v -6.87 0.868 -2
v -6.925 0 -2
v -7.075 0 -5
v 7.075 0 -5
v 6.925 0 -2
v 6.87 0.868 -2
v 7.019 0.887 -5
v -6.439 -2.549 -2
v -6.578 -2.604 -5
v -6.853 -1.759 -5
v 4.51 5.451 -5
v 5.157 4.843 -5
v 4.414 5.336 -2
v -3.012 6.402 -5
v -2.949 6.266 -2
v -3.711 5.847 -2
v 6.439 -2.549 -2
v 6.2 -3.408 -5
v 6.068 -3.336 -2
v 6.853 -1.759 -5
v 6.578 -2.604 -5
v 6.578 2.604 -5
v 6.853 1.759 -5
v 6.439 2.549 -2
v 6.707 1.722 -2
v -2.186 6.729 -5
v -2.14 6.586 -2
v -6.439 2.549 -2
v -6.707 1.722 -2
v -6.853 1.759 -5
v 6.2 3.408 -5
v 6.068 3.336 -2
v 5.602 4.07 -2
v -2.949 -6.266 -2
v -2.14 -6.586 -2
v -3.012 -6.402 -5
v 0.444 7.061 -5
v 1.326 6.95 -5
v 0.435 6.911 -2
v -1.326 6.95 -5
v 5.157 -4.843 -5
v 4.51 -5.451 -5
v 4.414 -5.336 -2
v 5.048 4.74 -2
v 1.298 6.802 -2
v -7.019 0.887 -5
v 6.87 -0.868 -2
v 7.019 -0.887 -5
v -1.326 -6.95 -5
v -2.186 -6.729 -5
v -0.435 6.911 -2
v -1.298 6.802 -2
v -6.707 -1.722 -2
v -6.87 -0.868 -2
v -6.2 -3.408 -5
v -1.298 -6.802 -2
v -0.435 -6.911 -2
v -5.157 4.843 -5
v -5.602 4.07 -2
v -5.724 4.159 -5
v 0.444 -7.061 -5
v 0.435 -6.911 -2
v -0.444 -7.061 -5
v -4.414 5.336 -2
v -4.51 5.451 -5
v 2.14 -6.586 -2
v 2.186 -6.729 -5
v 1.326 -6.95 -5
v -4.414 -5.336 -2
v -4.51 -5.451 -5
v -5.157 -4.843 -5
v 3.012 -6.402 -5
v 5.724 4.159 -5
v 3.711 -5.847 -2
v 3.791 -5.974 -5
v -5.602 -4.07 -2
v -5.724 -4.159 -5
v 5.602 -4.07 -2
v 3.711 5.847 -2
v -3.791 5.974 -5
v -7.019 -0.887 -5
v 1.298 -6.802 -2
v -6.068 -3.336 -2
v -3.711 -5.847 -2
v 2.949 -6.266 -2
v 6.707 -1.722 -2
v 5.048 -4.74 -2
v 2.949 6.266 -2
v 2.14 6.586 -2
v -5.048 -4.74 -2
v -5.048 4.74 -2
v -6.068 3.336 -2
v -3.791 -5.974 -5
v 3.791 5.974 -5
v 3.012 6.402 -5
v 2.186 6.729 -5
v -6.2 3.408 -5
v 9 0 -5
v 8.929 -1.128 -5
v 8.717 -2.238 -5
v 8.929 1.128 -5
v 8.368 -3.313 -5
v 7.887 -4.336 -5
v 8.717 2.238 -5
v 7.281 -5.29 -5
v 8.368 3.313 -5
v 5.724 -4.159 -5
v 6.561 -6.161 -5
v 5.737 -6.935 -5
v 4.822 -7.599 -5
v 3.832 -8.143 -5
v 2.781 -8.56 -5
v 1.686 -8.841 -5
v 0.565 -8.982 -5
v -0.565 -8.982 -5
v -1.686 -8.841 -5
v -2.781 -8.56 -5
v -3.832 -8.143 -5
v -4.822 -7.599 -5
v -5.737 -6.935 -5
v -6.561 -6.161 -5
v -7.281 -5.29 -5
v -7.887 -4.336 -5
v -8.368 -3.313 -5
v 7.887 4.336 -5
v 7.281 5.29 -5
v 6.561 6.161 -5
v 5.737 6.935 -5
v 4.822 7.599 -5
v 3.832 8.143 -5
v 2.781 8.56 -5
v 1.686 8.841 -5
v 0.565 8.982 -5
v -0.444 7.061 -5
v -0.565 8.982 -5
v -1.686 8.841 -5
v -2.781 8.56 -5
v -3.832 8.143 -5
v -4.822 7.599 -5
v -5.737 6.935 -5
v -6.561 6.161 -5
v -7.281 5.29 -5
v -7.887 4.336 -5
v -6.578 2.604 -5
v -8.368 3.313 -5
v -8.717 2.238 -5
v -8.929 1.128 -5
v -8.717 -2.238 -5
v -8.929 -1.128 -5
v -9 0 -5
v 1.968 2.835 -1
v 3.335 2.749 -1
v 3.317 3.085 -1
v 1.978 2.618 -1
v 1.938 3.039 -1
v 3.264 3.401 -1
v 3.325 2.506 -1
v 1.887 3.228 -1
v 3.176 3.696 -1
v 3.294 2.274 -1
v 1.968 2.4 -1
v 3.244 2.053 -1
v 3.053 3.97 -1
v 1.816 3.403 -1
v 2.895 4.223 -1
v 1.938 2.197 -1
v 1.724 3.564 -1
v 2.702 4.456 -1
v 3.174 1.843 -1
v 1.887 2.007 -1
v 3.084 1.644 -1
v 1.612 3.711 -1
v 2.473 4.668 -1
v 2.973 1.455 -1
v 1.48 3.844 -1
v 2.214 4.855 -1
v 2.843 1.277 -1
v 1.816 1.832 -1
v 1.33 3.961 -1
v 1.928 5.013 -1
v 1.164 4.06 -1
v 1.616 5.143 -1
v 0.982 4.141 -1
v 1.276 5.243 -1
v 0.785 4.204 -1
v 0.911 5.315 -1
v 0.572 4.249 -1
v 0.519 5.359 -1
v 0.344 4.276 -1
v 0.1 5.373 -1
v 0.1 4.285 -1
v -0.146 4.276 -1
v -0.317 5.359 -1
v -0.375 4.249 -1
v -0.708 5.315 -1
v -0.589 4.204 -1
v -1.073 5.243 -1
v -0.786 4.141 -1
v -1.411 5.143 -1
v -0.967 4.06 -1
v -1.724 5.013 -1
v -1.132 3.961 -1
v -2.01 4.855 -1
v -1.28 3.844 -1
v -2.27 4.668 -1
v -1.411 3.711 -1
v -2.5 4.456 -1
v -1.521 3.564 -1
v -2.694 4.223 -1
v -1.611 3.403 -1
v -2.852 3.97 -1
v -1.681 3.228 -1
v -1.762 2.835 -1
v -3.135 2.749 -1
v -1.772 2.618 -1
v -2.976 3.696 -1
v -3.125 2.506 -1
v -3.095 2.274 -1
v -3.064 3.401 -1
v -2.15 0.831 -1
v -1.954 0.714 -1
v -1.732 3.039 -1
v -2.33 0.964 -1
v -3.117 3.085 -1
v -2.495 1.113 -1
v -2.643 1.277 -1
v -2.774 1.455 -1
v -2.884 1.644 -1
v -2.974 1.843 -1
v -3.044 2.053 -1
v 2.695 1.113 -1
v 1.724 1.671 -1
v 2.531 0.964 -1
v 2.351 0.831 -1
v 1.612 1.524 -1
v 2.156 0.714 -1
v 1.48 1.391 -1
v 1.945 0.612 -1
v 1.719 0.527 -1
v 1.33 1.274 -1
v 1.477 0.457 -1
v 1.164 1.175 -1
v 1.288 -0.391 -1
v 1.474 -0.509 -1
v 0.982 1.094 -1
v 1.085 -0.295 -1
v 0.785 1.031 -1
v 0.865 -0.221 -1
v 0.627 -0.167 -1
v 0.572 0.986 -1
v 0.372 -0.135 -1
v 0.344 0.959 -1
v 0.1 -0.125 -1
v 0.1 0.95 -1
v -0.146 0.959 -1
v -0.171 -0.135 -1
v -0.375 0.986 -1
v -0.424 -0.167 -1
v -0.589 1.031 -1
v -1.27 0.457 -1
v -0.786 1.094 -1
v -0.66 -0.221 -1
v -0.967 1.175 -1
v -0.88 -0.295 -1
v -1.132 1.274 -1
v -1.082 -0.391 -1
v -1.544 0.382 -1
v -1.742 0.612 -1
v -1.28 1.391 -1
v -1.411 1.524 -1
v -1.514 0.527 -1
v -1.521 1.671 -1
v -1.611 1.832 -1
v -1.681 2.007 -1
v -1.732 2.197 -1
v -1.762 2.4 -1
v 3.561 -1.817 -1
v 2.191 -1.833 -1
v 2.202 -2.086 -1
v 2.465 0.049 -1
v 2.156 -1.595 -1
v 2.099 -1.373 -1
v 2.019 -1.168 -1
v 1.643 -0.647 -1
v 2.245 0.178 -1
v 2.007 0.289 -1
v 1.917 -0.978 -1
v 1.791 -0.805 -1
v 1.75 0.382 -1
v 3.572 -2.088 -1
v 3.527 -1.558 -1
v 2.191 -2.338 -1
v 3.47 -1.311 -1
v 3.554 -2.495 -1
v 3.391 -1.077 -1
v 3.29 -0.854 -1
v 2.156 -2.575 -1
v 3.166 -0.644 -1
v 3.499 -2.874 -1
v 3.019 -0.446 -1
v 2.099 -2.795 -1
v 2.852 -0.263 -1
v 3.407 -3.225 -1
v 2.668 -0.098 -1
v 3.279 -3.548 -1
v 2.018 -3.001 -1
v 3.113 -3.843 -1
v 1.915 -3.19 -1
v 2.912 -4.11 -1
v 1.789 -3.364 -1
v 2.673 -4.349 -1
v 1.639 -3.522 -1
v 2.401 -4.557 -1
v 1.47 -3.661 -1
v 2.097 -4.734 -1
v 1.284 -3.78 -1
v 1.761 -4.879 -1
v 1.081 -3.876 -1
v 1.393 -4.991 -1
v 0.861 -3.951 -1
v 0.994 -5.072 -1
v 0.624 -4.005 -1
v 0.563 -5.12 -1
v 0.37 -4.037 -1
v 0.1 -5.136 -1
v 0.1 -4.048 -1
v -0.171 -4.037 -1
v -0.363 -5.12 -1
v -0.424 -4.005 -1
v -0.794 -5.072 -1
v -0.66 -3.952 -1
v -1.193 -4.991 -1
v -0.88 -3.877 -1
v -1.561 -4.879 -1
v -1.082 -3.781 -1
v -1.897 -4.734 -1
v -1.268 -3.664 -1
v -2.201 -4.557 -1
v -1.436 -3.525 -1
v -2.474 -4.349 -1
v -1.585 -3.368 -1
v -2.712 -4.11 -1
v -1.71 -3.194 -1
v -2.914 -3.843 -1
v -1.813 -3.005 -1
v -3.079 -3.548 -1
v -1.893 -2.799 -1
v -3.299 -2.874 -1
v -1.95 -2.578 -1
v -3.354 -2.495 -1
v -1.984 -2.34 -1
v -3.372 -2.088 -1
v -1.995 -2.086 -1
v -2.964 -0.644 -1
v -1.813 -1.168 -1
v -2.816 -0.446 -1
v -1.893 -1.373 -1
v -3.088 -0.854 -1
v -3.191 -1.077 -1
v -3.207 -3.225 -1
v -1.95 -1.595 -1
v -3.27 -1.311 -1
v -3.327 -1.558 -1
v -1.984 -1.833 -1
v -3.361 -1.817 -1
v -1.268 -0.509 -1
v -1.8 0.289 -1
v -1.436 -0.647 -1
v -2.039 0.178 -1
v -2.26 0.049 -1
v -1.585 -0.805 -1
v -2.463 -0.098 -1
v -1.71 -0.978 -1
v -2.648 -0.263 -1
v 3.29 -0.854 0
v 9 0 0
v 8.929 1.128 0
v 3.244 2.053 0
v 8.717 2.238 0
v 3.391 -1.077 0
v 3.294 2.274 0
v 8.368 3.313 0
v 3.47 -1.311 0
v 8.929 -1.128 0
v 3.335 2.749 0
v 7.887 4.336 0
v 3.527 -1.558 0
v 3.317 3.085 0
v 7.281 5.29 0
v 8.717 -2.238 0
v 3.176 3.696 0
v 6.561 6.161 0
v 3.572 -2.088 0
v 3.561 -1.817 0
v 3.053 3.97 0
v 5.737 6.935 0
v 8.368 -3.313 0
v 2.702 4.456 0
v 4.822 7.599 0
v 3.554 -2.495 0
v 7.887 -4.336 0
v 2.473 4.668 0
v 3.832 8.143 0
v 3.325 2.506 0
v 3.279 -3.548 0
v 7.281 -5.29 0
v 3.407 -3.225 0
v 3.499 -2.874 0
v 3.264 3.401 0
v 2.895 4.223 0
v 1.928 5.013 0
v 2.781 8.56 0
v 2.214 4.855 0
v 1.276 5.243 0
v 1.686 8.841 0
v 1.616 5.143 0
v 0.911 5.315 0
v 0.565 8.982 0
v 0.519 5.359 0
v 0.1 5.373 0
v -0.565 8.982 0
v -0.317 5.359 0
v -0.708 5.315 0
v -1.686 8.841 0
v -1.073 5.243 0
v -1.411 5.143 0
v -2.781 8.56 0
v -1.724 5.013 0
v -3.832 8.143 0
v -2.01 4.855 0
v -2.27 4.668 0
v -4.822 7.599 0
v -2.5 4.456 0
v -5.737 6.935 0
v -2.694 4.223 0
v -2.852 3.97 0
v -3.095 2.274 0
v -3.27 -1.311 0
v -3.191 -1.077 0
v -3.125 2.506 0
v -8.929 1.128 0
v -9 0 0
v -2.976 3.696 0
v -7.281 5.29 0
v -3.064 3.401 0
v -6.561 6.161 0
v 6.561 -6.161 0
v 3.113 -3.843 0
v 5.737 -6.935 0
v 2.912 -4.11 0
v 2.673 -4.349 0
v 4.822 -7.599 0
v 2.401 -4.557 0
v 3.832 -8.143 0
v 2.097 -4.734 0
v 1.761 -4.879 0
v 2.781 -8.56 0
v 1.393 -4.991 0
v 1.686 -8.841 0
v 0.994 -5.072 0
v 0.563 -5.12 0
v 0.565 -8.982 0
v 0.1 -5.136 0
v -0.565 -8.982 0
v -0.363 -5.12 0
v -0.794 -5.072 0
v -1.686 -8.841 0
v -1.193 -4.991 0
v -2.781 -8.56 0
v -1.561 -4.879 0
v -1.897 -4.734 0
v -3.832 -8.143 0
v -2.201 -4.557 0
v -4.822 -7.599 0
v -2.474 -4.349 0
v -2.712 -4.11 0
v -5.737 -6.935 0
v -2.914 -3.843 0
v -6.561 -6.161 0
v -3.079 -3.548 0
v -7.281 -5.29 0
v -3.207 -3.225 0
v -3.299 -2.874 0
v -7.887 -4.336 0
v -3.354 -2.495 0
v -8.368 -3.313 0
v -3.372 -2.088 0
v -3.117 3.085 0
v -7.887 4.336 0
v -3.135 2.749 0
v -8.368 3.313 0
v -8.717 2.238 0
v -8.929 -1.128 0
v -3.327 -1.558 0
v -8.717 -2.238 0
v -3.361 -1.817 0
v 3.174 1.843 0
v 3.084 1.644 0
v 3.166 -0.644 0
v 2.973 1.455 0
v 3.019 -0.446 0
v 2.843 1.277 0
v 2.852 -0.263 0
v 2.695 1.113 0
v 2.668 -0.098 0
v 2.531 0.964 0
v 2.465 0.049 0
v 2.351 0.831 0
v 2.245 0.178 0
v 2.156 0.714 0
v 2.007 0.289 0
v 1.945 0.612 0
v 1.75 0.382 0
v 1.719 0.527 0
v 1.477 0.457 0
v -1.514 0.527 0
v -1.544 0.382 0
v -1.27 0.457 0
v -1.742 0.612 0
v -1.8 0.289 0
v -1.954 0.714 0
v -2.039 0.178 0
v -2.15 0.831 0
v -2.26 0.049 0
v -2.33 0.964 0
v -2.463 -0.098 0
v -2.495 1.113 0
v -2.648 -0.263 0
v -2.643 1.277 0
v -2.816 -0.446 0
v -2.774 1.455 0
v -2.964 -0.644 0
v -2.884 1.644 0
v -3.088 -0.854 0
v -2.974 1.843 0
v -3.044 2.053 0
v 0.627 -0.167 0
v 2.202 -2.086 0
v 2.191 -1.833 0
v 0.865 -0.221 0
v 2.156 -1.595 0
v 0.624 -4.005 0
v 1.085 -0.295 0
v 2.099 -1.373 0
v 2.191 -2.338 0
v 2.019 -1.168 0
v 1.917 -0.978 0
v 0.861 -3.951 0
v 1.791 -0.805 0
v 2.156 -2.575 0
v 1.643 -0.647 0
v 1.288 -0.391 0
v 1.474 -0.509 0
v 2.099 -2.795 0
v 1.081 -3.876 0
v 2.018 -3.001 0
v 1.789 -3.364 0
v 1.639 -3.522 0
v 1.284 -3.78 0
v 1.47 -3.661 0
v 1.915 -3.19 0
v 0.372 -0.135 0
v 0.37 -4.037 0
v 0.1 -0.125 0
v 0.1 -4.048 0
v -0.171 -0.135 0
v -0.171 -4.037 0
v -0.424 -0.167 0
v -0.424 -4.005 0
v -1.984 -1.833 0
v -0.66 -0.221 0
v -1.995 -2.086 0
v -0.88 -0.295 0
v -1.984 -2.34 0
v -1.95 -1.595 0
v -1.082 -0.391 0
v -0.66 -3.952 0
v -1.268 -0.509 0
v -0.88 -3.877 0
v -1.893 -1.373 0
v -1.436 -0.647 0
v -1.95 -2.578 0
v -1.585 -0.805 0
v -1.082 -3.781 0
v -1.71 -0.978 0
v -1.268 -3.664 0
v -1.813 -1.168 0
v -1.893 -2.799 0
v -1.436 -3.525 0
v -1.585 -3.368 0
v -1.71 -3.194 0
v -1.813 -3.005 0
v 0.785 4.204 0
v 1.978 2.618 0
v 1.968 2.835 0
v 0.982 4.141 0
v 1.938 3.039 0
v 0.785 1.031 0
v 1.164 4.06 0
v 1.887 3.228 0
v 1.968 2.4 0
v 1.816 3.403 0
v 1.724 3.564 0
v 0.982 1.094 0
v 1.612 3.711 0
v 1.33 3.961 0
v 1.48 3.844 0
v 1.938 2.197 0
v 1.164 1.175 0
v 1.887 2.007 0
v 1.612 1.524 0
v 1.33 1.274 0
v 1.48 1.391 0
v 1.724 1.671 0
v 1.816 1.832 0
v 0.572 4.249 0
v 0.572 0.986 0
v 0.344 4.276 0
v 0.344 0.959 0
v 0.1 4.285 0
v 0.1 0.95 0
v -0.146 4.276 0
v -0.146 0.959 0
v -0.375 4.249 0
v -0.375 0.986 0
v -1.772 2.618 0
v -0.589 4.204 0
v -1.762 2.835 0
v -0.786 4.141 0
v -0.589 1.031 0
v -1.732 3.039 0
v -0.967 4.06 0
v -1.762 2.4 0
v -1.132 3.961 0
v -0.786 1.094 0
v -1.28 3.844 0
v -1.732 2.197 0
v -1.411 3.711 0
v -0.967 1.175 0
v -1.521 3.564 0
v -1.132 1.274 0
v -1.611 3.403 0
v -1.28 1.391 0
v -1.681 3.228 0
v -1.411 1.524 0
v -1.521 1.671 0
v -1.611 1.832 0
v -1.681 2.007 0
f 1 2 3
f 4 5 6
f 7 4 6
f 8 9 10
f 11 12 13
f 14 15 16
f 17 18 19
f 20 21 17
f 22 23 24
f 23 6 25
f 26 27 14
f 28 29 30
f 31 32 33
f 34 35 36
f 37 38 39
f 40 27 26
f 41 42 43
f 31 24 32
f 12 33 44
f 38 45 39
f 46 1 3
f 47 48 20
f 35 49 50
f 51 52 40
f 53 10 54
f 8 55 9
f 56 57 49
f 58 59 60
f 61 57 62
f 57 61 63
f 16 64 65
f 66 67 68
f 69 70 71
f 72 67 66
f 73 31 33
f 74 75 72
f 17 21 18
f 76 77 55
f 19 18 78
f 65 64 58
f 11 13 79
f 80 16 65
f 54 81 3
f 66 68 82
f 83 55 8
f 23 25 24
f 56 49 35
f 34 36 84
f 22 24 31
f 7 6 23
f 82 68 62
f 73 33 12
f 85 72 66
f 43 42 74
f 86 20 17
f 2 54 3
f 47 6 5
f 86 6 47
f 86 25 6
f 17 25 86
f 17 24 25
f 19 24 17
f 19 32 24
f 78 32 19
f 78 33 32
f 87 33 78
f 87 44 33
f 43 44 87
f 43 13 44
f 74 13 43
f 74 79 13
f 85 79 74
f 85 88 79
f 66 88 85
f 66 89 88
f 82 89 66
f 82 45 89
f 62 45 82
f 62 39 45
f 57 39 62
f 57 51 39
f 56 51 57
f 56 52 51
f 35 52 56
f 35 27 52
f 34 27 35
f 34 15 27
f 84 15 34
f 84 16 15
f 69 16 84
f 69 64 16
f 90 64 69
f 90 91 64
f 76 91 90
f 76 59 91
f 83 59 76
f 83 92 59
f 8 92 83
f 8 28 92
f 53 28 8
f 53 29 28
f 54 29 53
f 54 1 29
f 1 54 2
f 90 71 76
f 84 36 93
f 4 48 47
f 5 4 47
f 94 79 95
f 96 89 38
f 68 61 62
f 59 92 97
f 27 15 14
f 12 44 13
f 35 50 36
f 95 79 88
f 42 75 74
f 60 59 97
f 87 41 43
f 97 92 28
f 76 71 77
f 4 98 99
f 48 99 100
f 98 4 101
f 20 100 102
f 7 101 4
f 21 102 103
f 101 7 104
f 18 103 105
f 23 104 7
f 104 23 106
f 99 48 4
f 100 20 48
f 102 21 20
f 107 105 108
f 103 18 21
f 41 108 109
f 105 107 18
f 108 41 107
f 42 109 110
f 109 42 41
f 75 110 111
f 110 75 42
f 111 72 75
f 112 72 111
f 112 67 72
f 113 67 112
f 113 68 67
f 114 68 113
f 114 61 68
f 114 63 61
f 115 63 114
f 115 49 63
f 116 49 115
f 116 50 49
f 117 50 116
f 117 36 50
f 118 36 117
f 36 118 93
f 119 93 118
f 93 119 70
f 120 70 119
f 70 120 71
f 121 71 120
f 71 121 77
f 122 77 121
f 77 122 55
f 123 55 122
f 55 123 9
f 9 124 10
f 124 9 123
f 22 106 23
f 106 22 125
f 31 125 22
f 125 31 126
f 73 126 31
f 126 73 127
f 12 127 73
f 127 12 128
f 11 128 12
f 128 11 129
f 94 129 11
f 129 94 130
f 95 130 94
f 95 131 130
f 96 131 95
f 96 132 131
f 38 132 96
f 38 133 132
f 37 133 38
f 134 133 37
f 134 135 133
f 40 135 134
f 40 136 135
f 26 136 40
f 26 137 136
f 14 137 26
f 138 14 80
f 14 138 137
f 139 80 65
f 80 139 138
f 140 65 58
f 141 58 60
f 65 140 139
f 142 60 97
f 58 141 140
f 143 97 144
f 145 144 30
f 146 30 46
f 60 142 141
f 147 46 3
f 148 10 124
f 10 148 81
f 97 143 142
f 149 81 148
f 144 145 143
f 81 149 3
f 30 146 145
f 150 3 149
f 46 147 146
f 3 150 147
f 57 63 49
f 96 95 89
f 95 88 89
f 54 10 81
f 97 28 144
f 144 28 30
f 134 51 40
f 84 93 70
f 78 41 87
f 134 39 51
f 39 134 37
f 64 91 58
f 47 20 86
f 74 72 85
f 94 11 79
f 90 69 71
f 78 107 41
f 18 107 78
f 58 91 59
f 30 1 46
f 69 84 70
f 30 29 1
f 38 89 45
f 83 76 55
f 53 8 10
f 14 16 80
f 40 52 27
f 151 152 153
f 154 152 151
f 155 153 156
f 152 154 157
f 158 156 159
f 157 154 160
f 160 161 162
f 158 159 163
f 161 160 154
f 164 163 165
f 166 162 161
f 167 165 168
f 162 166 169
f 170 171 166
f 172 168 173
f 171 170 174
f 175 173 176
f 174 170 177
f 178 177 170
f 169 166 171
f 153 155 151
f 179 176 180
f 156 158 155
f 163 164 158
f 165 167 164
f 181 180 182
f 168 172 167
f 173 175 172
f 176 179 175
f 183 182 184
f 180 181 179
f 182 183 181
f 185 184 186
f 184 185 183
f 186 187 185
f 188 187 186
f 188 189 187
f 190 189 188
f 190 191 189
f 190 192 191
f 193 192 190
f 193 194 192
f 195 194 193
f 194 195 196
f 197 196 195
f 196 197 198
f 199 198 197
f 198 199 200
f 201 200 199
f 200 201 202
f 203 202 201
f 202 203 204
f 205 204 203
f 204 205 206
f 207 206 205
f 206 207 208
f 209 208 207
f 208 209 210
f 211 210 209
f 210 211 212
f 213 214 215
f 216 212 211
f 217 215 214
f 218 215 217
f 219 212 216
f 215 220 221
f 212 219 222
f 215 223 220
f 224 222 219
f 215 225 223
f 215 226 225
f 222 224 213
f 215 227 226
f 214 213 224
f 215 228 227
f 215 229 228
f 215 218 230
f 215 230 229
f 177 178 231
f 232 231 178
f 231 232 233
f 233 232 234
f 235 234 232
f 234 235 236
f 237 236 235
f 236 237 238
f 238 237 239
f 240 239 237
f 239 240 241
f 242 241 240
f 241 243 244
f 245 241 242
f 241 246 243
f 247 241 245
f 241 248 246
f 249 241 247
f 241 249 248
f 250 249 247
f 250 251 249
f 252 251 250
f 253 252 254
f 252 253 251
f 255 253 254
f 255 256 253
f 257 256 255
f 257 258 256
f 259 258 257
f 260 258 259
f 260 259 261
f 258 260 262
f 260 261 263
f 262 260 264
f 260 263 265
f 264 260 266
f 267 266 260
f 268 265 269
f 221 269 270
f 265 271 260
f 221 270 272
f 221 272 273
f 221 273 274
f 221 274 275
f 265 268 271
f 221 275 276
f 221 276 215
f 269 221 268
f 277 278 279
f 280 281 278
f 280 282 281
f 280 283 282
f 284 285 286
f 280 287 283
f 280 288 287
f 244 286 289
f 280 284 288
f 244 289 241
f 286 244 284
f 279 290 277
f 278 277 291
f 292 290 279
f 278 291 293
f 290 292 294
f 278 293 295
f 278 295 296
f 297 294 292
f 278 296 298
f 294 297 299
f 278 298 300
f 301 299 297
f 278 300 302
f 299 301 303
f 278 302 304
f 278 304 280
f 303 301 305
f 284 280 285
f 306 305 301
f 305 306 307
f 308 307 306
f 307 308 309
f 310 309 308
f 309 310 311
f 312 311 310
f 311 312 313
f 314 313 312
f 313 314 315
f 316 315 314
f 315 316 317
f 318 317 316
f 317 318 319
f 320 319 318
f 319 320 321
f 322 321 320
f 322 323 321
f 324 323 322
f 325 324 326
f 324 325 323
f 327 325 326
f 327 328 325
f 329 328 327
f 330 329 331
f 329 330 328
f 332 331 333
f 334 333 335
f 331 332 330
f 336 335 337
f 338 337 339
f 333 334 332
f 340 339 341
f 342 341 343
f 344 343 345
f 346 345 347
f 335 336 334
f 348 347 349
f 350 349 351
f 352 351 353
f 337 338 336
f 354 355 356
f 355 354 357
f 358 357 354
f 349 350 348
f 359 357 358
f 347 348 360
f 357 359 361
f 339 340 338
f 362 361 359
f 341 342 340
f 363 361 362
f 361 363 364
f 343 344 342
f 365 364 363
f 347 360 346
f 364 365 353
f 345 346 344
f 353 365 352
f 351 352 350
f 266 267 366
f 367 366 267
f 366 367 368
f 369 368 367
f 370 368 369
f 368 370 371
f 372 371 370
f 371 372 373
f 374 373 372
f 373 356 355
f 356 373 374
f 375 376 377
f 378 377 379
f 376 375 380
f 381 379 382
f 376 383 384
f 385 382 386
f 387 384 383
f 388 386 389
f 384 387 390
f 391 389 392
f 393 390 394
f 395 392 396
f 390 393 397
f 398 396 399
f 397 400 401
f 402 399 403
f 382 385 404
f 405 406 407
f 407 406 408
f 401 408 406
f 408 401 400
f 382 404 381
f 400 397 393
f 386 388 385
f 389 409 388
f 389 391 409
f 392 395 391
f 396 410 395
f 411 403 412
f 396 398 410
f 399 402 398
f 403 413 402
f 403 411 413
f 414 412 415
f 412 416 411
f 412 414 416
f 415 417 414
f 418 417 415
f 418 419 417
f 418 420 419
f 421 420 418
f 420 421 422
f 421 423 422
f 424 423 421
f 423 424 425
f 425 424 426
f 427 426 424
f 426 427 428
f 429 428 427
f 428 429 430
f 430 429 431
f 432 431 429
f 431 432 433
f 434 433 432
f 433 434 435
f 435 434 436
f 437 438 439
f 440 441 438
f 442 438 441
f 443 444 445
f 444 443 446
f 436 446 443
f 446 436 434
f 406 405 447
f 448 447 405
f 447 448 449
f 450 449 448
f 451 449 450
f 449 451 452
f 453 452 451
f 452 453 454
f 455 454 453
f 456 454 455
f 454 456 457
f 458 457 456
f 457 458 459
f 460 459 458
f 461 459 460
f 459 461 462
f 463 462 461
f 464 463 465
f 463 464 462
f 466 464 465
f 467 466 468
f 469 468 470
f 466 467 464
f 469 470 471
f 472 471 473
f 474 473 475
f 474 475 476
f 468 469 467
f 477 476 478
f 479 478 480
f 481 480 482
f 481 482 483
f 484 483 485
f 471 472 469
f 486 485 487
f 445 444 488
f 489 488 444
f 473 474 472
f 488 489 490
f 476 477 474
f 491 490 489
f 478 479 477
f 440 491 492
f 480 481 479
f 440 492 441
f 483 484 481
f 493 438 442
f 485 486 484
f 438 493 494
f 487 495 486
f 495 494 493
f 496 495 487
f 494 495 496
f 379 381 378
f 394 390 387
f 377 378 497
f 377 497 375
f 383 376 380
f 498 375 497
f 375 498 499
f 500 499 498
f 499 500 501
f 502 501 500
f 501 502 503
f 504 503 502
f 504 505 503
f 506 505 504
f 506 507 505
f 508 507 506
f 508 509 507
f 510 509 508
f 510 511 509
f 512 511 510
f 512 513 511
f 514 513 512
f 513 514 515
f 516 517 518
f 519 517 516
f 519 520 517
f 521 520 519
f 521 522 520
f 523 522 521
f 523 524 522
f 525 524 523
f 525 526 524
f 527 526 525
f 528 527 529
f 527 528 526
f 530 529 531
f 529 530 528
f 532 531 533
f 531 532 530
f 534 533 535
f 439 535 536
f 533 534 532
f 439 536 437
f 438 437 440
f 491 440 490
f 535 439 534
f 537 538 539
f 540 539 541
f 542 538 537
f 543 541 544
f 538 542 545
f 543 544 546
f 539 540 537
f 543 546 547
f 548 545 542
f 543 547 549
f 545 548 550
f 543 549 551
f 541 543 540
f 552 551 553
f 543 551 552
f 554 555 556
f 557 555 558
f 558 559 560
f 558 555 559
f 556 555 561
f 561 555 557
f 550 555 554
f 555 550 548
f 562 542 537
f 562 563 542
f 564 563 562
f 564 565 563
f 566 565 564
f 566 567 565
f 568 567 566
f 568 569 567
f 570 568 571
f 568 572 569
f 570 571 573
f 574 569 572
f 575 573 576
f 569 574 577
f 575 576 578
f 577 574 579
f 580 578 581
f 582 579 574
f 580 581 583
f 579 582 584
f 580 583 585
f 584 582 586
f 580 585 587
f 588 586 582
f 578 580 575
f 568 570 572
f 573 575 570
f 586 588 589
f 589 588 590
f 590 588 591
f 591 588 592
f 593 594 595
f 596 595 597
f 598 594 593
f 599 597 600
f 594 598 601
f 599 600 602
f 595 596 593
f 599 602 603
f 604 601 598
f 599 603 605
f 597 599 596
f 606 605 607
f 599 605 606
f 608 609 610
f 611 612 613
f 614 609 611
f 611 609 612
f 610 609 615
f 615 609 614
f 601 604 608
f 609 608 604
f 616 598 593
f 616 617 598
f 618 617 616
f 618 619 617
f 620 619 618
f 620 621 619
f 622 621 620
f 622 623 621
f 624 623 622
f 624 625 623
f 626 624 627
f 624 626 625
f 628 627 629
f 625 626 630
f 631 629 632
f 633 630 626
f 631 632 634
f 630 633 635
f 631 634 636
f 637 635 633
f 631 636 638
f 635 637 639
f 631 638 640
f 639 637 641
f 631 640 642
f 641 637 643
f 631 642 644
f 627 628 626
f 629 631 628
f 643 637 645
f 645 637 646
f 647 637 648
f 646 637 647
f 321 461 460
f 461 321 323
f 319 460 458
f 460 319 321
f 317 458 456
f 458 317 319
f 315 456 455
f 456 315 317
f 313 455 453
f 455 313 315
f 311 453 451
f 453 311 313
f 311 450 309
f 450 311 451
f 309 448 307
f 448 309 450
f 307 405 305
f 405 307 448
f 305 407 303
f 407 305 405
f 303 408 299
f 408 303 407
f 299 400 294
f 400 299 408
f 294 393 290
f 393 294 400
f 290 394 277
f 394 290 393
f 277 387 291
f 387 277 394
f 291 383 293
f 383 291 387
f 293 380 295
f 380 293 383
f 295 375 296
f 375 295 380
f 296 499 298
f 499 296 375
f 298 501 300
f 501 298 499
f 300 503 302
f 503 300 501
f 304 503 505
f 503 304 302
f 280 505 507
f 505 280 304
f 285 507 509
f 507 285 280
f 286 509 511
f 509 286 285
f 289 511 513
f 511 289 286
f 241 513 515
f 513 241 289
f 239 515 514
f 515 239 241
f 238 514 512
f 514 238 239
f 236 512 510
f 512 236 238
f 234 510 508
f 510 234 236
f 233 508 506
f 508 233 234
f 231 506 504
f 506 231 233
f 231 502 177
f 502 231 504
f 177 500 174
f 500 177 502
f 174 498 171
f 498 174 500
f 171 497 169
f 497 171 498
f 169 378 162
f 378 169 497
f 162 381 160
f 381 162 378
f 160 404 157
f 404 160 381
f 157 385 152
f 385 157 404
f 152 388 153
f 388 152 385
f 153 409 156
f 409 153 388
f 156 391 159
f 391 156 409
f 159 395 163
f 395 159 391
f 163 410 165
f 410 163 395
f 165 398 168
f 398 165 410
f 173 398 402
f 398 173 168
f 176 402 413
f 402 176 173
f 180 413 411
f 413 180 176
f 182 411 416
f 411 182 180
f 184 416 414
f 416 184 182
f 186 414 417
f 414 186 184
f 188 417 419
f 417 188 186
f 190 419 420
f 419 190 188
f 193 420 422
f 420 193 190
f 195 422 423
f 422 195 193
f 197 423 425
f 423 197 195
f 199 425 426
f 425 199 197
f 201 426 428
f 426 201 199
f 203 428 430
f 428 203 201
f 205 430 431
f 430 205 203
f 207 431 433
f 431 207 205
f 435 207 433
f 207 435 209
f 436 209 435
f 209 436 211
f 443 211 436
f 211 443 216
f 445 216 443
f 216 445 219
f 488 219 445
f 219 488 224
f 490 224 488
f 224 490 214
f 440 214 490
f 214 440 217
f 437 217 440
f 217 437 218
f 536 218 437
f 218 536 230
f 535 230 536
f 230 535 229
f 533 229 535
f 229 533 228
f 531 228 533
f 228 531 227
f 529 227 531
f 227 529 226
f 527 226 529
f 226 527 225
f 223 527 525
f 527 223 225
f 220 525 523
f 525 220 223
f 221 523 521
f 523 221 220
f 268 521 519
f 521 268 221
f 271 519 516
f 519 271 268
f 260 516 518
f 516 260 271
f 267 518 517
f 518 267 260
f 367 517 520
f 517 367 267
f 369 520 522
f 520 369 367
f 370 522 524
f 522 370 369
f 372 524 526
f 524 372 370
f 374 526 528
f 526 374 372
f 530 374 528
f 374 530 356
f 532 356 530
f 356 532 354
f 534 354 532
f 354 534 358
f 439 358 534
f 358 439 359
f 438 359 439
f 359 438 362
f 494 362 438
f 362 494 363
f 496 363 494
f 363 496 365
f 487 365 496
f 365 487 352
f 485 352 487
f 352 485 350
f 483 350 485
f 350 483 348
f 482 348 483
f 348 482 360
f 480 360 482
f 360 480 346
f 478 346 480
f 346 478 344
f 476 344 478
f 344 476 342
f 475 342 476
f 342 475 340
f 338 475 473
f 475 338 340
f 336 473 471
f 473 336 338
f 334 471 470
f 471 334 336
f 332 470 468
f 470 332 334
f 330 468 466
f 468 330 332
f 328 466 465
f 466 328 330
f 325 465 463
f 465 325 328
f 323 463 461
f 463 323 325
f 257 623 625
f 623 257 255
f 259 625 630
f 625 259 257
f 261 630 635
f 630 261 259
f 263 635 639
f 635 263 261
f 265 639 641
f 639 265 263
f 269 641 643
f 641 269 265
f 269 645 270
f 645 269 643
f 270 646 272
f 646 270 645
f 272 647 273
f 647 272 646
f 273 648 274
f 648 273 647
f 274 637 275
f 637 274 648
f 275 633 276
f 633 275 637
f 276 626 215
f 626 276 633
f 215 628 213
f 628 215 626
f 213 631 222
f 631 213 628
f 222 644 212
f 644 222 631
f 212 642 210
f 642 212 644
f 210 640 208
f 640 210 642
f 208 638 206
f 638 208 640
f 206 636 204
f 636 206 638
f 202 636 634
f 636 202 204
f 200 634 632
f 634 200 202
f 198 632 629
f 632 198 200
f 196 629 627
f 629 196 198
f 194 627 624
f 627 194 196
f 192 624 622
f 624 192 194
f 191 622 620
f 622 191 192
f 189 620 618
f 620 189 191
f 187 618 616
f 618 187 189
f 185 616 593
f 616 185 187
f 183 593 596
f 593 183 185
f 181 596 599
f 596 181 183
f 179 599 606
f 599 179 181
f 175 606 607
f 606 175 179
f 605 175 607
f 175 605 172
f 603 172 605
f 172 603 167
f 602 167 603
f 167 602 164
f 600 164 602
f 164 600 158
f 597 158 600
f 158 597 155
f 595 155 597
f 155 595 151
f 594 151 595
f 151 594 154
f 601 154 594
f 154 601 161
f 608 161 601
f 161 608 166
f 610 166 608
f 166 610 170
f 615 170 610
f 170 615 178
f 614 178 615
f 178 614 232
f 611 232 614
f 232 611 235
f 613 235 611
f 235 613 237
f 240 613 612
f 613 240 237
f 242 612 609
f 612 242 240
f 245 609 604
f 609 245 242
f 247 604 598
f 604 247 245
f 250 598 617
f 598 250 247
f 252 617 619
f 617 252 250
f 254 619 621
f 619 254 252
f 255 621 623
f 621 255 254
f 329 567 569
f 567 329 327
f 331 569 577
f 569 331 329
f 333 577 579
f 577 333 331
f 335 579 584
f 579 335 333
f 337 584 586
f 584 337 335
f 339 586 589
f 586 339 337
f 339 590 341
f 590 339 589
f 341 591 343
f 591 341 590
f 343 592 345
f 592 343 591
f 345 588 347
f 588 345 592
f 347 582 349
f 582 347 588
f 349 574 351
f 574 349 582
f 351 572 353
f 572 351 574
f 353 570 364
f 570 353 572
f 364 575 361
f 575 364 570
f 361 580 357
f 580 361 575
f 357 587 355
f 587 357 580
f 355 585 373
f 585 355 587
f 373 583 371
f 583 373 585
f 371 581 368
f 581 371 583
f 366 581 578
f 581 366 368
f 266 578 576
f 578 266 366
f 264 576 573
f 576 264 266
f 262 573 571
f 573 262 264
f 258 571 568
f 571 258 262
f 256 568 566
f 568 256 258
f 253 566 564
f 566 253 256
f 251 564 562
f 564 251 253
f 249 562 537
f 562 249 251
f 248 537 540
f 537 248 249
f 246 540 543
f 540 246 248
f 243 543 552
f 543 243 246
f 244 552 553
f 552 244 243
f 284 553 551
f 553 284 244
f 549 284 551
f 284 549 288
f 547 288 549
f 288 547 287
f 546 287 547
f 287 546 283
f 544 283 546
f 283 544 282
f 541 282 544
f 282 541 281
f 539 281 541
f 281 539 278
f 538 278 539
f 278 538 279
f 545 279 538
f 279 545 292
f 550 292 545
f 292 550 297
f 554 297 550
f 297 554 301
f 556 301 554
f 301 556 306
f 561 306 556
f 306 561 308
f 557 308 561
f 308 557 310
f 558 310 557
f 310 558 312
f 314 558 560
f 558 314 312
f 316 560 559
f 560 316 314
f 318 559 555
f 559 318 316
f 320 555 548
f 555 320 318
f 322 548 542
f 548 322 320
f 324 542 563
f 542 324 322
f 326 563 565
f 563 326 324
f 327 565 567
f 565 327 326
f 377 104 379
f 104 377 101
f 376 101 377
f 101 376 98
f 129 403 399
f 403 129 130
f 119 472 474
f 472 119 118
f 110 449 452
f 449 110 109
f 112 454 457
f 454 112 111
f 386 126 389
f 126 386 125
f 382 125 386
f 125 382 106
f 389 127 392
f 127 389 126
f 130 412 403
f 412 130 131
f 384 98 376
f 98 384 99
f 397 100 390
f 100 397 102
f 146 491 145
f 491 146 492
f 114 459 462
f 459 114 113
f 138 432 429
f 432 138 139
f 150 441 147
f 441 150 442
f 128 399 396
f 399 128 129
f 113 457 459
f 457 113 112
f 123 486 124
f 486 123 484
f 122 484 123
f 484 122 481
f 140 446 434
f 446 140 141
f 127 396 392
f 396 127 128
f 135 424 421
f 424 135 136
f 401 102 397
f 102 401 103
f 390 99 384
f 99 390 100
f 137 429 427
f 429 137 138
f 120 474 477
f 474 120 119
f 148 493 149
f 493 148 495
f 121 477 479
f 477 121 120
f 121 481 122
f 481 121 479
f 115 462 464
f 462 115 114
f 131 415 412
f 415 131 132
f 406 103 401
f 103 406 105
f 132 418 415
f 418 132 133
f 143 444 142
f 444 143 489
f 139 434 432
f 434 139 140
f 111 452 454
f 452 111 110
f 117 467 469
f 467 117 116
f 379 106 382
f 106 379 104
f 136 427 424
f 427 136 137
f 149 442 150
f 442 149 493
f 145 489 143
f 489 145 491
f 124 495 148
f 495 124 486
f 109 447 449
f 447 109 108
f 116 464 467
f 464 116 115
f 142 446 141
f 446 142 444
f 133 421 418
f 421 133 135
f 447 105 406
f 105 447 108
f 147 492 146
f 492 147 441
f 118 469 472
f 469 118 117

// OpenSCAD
$fn = 50;

difference() {
	union() {
		translate(v = [0, 0, -5.0]) {
			cylinder(h = 5, r = 9.0);
		}
	}
	union() {
		#translate(v = [0, 0, -5.0]) {
			cylinder(h = 3, r1 = 7.075, r2 = 6.925);
		}
		translate(v = [0, 0, -1]) {
			linear_extrude(height = 1) {
				text(font = "Impact", halign = "center", size = 10, text = "8", valign = "center");
			}
		}
	}
}
